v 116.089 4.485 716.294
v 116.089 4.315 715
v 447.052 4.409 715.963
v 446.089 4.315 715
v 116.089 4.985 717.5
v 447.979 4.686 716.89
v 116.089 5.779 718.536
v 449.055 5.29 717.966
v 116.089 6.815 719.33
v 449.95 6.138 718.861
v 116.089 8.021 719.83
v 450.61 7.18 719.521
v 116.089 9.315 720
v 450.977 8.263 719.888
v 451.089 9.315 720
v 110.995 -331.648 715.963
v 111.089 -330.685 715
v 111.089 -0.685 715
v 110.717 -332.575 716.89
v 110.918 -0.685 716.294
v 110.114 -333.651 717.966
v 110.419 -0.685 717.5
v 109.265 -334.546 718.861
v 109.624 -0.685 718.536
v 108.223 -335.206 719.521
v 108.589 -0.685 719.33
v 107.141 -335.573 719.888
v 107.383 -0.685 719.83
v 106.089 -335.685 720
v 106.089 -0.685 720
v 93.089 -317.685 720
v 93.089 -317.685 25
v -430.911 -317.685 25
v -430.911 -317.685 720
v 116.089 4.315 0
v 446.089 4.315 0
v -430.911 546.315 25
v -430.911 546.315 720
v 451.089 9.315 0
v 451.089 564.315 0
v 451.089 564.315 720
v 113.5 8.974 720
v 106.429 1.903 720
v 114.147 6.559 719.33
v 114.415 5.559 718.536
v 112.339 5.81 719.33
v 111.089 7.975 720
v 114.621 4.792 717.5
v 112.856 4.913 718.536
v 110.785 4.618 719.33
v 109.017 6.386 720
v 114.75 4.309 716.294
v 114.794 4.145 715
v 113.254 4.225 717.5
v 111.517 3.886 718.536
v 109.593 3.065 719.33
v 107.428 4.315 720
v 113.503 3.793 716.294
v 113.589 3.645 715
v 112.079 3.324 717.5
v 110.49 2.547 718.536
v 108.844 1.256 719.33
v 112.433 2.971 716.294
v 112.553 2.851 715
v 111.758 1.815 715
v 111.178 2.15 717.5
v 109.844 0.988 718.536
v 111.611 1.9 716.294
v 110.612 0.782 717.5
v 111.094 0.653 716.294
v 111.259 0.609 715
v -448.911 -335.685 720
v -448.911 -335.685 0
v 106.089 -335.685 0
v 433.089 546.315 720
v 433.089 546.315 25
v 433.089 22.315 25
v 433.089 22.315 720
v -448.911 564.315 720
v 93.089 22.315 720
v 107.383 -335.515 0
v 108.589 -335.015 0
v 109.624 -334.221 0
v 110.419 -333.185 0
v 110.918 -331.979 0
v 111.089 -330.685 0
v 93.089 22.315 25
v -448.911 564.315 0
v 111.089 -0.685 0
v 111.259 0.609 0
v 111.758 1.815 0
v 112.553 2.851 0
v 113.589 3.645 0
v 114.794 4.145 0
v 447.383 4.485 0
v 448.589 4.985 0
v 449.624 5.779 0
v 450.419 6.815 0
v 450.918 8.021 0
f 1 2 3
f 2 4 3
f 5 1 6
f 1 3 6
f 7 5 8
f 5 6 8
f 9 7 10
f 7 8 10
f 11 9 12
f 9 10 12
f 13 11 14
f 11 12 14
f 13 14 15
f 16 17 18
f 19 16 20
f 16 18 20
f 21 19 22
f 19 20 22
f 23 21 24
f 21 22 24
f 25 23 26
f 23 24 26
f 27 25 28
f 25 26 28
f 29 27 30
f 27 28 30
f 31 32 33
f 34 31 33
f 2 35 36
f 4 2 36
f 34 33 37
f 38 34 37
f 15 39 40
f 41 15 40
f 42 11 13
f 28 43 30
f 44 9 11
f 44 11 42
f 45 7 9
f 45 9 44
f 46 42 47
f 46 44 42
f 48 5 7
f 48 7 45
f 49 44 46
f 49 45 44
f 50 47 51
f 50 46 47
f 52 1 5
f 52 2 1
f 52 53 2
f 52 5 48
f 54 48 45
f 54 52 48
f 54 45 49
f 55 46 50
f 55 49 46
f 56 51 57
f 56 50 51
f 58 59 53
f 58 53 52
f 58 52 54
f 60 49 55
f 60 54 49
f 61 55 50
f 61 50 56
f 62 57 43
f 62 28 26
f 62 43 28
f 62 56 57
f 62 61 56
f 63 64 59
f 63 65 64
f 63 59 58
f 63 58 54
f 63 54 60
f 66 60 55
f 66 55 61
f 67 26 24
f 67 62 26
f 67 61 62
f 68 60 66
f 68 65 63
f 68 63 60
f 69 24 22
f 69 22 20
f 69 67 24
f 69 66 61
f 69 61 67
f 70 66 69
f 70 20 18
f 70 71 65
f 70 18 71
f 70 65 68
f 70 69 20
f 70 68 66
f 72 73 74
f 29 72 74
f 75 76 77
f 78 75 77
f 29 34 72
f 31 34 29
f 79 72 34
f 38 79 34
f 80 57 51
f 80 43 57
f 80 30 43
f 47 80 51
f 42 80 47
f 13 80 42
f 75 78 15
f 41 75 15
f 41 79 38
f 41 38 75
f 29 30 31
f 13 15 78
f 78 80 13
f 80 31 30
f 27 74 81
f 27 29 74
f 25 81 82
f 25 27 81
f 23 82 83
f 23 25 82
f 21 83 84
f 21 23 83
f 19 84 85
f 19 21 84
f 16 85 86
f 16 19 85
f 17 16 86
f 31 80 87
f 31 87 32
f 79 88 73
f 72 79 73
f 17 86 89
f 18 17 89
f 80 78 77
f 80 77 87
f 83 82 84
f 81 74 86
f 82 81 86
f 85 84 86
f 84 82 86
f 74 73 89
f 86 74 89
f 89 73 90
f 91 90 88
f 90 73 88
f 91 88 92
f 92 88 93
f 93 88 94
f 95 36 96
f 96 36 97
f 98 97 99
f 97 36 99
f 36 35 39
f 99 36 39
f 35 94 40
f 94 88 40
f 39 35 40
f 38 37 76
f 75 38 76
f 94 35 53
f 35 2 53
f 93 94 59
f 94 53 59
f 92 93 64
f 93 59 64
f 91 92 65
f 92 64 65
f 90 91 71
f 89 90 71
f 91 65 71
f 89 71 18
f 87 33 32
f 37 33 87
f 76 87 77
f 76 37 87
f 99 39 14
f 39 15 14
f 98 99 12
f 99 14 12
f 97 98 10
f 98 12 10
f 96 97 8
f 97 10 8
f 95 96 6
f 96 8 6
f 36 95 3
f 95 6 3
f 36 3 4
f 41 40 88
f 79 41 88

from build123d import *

# Parameters (mm, degrees)
F1_DEPTH = 720
F2_DEPTH = 25
F3_R     = 5


with BuildPart() as f1:
    # F0 (on Top) → F1 (new body)
    with BuildSketch(Plane.XY):
        Polygon((451.088522, 564.315002), (-448.911478, 564.315002), (-448.911478, -335.684998), (111.088522, -335.684998), (111.088522, 4.315002), (451.088522, 4.315002), align=None)
        Polygon((-430.911478, -317.684998), (-430.911478, 546.315002), (433.088522, 546.315002), (433.088522, 22.315002), (93.088522, 22.315002), (93.088522, -317.684998), align=None, mode=Mode.SUBTRACT)
    extrude(amount=F1_DEPTH)

    # F0 (on Top) → F2 (join)
    with BuildSketch(Plane.XY):
        Polygon((433.088522, 546.315002), (-430.911478, 546.315002), (-430.911478, -317.684998), (93.088522, -317.684998), (93.088522, 22.315002), (433.088522, 22.315002), align=None)
    extrude(amount=F2_DEPTH)

    # F3
    f3_edges = [f1.edges().sort_by_distance(p)[0] for p in [
        (451.088522, 4.315002, 360),
        (111.088522, 4.315002, 360),
        (111.088522, -335.684998, 360),
        (281.088522, 4.315002, 720),
        (111.088522, -165.684998, 720),
    ]]
    fillet(f3_edges, radius=F3_R)


solid = f1.part
